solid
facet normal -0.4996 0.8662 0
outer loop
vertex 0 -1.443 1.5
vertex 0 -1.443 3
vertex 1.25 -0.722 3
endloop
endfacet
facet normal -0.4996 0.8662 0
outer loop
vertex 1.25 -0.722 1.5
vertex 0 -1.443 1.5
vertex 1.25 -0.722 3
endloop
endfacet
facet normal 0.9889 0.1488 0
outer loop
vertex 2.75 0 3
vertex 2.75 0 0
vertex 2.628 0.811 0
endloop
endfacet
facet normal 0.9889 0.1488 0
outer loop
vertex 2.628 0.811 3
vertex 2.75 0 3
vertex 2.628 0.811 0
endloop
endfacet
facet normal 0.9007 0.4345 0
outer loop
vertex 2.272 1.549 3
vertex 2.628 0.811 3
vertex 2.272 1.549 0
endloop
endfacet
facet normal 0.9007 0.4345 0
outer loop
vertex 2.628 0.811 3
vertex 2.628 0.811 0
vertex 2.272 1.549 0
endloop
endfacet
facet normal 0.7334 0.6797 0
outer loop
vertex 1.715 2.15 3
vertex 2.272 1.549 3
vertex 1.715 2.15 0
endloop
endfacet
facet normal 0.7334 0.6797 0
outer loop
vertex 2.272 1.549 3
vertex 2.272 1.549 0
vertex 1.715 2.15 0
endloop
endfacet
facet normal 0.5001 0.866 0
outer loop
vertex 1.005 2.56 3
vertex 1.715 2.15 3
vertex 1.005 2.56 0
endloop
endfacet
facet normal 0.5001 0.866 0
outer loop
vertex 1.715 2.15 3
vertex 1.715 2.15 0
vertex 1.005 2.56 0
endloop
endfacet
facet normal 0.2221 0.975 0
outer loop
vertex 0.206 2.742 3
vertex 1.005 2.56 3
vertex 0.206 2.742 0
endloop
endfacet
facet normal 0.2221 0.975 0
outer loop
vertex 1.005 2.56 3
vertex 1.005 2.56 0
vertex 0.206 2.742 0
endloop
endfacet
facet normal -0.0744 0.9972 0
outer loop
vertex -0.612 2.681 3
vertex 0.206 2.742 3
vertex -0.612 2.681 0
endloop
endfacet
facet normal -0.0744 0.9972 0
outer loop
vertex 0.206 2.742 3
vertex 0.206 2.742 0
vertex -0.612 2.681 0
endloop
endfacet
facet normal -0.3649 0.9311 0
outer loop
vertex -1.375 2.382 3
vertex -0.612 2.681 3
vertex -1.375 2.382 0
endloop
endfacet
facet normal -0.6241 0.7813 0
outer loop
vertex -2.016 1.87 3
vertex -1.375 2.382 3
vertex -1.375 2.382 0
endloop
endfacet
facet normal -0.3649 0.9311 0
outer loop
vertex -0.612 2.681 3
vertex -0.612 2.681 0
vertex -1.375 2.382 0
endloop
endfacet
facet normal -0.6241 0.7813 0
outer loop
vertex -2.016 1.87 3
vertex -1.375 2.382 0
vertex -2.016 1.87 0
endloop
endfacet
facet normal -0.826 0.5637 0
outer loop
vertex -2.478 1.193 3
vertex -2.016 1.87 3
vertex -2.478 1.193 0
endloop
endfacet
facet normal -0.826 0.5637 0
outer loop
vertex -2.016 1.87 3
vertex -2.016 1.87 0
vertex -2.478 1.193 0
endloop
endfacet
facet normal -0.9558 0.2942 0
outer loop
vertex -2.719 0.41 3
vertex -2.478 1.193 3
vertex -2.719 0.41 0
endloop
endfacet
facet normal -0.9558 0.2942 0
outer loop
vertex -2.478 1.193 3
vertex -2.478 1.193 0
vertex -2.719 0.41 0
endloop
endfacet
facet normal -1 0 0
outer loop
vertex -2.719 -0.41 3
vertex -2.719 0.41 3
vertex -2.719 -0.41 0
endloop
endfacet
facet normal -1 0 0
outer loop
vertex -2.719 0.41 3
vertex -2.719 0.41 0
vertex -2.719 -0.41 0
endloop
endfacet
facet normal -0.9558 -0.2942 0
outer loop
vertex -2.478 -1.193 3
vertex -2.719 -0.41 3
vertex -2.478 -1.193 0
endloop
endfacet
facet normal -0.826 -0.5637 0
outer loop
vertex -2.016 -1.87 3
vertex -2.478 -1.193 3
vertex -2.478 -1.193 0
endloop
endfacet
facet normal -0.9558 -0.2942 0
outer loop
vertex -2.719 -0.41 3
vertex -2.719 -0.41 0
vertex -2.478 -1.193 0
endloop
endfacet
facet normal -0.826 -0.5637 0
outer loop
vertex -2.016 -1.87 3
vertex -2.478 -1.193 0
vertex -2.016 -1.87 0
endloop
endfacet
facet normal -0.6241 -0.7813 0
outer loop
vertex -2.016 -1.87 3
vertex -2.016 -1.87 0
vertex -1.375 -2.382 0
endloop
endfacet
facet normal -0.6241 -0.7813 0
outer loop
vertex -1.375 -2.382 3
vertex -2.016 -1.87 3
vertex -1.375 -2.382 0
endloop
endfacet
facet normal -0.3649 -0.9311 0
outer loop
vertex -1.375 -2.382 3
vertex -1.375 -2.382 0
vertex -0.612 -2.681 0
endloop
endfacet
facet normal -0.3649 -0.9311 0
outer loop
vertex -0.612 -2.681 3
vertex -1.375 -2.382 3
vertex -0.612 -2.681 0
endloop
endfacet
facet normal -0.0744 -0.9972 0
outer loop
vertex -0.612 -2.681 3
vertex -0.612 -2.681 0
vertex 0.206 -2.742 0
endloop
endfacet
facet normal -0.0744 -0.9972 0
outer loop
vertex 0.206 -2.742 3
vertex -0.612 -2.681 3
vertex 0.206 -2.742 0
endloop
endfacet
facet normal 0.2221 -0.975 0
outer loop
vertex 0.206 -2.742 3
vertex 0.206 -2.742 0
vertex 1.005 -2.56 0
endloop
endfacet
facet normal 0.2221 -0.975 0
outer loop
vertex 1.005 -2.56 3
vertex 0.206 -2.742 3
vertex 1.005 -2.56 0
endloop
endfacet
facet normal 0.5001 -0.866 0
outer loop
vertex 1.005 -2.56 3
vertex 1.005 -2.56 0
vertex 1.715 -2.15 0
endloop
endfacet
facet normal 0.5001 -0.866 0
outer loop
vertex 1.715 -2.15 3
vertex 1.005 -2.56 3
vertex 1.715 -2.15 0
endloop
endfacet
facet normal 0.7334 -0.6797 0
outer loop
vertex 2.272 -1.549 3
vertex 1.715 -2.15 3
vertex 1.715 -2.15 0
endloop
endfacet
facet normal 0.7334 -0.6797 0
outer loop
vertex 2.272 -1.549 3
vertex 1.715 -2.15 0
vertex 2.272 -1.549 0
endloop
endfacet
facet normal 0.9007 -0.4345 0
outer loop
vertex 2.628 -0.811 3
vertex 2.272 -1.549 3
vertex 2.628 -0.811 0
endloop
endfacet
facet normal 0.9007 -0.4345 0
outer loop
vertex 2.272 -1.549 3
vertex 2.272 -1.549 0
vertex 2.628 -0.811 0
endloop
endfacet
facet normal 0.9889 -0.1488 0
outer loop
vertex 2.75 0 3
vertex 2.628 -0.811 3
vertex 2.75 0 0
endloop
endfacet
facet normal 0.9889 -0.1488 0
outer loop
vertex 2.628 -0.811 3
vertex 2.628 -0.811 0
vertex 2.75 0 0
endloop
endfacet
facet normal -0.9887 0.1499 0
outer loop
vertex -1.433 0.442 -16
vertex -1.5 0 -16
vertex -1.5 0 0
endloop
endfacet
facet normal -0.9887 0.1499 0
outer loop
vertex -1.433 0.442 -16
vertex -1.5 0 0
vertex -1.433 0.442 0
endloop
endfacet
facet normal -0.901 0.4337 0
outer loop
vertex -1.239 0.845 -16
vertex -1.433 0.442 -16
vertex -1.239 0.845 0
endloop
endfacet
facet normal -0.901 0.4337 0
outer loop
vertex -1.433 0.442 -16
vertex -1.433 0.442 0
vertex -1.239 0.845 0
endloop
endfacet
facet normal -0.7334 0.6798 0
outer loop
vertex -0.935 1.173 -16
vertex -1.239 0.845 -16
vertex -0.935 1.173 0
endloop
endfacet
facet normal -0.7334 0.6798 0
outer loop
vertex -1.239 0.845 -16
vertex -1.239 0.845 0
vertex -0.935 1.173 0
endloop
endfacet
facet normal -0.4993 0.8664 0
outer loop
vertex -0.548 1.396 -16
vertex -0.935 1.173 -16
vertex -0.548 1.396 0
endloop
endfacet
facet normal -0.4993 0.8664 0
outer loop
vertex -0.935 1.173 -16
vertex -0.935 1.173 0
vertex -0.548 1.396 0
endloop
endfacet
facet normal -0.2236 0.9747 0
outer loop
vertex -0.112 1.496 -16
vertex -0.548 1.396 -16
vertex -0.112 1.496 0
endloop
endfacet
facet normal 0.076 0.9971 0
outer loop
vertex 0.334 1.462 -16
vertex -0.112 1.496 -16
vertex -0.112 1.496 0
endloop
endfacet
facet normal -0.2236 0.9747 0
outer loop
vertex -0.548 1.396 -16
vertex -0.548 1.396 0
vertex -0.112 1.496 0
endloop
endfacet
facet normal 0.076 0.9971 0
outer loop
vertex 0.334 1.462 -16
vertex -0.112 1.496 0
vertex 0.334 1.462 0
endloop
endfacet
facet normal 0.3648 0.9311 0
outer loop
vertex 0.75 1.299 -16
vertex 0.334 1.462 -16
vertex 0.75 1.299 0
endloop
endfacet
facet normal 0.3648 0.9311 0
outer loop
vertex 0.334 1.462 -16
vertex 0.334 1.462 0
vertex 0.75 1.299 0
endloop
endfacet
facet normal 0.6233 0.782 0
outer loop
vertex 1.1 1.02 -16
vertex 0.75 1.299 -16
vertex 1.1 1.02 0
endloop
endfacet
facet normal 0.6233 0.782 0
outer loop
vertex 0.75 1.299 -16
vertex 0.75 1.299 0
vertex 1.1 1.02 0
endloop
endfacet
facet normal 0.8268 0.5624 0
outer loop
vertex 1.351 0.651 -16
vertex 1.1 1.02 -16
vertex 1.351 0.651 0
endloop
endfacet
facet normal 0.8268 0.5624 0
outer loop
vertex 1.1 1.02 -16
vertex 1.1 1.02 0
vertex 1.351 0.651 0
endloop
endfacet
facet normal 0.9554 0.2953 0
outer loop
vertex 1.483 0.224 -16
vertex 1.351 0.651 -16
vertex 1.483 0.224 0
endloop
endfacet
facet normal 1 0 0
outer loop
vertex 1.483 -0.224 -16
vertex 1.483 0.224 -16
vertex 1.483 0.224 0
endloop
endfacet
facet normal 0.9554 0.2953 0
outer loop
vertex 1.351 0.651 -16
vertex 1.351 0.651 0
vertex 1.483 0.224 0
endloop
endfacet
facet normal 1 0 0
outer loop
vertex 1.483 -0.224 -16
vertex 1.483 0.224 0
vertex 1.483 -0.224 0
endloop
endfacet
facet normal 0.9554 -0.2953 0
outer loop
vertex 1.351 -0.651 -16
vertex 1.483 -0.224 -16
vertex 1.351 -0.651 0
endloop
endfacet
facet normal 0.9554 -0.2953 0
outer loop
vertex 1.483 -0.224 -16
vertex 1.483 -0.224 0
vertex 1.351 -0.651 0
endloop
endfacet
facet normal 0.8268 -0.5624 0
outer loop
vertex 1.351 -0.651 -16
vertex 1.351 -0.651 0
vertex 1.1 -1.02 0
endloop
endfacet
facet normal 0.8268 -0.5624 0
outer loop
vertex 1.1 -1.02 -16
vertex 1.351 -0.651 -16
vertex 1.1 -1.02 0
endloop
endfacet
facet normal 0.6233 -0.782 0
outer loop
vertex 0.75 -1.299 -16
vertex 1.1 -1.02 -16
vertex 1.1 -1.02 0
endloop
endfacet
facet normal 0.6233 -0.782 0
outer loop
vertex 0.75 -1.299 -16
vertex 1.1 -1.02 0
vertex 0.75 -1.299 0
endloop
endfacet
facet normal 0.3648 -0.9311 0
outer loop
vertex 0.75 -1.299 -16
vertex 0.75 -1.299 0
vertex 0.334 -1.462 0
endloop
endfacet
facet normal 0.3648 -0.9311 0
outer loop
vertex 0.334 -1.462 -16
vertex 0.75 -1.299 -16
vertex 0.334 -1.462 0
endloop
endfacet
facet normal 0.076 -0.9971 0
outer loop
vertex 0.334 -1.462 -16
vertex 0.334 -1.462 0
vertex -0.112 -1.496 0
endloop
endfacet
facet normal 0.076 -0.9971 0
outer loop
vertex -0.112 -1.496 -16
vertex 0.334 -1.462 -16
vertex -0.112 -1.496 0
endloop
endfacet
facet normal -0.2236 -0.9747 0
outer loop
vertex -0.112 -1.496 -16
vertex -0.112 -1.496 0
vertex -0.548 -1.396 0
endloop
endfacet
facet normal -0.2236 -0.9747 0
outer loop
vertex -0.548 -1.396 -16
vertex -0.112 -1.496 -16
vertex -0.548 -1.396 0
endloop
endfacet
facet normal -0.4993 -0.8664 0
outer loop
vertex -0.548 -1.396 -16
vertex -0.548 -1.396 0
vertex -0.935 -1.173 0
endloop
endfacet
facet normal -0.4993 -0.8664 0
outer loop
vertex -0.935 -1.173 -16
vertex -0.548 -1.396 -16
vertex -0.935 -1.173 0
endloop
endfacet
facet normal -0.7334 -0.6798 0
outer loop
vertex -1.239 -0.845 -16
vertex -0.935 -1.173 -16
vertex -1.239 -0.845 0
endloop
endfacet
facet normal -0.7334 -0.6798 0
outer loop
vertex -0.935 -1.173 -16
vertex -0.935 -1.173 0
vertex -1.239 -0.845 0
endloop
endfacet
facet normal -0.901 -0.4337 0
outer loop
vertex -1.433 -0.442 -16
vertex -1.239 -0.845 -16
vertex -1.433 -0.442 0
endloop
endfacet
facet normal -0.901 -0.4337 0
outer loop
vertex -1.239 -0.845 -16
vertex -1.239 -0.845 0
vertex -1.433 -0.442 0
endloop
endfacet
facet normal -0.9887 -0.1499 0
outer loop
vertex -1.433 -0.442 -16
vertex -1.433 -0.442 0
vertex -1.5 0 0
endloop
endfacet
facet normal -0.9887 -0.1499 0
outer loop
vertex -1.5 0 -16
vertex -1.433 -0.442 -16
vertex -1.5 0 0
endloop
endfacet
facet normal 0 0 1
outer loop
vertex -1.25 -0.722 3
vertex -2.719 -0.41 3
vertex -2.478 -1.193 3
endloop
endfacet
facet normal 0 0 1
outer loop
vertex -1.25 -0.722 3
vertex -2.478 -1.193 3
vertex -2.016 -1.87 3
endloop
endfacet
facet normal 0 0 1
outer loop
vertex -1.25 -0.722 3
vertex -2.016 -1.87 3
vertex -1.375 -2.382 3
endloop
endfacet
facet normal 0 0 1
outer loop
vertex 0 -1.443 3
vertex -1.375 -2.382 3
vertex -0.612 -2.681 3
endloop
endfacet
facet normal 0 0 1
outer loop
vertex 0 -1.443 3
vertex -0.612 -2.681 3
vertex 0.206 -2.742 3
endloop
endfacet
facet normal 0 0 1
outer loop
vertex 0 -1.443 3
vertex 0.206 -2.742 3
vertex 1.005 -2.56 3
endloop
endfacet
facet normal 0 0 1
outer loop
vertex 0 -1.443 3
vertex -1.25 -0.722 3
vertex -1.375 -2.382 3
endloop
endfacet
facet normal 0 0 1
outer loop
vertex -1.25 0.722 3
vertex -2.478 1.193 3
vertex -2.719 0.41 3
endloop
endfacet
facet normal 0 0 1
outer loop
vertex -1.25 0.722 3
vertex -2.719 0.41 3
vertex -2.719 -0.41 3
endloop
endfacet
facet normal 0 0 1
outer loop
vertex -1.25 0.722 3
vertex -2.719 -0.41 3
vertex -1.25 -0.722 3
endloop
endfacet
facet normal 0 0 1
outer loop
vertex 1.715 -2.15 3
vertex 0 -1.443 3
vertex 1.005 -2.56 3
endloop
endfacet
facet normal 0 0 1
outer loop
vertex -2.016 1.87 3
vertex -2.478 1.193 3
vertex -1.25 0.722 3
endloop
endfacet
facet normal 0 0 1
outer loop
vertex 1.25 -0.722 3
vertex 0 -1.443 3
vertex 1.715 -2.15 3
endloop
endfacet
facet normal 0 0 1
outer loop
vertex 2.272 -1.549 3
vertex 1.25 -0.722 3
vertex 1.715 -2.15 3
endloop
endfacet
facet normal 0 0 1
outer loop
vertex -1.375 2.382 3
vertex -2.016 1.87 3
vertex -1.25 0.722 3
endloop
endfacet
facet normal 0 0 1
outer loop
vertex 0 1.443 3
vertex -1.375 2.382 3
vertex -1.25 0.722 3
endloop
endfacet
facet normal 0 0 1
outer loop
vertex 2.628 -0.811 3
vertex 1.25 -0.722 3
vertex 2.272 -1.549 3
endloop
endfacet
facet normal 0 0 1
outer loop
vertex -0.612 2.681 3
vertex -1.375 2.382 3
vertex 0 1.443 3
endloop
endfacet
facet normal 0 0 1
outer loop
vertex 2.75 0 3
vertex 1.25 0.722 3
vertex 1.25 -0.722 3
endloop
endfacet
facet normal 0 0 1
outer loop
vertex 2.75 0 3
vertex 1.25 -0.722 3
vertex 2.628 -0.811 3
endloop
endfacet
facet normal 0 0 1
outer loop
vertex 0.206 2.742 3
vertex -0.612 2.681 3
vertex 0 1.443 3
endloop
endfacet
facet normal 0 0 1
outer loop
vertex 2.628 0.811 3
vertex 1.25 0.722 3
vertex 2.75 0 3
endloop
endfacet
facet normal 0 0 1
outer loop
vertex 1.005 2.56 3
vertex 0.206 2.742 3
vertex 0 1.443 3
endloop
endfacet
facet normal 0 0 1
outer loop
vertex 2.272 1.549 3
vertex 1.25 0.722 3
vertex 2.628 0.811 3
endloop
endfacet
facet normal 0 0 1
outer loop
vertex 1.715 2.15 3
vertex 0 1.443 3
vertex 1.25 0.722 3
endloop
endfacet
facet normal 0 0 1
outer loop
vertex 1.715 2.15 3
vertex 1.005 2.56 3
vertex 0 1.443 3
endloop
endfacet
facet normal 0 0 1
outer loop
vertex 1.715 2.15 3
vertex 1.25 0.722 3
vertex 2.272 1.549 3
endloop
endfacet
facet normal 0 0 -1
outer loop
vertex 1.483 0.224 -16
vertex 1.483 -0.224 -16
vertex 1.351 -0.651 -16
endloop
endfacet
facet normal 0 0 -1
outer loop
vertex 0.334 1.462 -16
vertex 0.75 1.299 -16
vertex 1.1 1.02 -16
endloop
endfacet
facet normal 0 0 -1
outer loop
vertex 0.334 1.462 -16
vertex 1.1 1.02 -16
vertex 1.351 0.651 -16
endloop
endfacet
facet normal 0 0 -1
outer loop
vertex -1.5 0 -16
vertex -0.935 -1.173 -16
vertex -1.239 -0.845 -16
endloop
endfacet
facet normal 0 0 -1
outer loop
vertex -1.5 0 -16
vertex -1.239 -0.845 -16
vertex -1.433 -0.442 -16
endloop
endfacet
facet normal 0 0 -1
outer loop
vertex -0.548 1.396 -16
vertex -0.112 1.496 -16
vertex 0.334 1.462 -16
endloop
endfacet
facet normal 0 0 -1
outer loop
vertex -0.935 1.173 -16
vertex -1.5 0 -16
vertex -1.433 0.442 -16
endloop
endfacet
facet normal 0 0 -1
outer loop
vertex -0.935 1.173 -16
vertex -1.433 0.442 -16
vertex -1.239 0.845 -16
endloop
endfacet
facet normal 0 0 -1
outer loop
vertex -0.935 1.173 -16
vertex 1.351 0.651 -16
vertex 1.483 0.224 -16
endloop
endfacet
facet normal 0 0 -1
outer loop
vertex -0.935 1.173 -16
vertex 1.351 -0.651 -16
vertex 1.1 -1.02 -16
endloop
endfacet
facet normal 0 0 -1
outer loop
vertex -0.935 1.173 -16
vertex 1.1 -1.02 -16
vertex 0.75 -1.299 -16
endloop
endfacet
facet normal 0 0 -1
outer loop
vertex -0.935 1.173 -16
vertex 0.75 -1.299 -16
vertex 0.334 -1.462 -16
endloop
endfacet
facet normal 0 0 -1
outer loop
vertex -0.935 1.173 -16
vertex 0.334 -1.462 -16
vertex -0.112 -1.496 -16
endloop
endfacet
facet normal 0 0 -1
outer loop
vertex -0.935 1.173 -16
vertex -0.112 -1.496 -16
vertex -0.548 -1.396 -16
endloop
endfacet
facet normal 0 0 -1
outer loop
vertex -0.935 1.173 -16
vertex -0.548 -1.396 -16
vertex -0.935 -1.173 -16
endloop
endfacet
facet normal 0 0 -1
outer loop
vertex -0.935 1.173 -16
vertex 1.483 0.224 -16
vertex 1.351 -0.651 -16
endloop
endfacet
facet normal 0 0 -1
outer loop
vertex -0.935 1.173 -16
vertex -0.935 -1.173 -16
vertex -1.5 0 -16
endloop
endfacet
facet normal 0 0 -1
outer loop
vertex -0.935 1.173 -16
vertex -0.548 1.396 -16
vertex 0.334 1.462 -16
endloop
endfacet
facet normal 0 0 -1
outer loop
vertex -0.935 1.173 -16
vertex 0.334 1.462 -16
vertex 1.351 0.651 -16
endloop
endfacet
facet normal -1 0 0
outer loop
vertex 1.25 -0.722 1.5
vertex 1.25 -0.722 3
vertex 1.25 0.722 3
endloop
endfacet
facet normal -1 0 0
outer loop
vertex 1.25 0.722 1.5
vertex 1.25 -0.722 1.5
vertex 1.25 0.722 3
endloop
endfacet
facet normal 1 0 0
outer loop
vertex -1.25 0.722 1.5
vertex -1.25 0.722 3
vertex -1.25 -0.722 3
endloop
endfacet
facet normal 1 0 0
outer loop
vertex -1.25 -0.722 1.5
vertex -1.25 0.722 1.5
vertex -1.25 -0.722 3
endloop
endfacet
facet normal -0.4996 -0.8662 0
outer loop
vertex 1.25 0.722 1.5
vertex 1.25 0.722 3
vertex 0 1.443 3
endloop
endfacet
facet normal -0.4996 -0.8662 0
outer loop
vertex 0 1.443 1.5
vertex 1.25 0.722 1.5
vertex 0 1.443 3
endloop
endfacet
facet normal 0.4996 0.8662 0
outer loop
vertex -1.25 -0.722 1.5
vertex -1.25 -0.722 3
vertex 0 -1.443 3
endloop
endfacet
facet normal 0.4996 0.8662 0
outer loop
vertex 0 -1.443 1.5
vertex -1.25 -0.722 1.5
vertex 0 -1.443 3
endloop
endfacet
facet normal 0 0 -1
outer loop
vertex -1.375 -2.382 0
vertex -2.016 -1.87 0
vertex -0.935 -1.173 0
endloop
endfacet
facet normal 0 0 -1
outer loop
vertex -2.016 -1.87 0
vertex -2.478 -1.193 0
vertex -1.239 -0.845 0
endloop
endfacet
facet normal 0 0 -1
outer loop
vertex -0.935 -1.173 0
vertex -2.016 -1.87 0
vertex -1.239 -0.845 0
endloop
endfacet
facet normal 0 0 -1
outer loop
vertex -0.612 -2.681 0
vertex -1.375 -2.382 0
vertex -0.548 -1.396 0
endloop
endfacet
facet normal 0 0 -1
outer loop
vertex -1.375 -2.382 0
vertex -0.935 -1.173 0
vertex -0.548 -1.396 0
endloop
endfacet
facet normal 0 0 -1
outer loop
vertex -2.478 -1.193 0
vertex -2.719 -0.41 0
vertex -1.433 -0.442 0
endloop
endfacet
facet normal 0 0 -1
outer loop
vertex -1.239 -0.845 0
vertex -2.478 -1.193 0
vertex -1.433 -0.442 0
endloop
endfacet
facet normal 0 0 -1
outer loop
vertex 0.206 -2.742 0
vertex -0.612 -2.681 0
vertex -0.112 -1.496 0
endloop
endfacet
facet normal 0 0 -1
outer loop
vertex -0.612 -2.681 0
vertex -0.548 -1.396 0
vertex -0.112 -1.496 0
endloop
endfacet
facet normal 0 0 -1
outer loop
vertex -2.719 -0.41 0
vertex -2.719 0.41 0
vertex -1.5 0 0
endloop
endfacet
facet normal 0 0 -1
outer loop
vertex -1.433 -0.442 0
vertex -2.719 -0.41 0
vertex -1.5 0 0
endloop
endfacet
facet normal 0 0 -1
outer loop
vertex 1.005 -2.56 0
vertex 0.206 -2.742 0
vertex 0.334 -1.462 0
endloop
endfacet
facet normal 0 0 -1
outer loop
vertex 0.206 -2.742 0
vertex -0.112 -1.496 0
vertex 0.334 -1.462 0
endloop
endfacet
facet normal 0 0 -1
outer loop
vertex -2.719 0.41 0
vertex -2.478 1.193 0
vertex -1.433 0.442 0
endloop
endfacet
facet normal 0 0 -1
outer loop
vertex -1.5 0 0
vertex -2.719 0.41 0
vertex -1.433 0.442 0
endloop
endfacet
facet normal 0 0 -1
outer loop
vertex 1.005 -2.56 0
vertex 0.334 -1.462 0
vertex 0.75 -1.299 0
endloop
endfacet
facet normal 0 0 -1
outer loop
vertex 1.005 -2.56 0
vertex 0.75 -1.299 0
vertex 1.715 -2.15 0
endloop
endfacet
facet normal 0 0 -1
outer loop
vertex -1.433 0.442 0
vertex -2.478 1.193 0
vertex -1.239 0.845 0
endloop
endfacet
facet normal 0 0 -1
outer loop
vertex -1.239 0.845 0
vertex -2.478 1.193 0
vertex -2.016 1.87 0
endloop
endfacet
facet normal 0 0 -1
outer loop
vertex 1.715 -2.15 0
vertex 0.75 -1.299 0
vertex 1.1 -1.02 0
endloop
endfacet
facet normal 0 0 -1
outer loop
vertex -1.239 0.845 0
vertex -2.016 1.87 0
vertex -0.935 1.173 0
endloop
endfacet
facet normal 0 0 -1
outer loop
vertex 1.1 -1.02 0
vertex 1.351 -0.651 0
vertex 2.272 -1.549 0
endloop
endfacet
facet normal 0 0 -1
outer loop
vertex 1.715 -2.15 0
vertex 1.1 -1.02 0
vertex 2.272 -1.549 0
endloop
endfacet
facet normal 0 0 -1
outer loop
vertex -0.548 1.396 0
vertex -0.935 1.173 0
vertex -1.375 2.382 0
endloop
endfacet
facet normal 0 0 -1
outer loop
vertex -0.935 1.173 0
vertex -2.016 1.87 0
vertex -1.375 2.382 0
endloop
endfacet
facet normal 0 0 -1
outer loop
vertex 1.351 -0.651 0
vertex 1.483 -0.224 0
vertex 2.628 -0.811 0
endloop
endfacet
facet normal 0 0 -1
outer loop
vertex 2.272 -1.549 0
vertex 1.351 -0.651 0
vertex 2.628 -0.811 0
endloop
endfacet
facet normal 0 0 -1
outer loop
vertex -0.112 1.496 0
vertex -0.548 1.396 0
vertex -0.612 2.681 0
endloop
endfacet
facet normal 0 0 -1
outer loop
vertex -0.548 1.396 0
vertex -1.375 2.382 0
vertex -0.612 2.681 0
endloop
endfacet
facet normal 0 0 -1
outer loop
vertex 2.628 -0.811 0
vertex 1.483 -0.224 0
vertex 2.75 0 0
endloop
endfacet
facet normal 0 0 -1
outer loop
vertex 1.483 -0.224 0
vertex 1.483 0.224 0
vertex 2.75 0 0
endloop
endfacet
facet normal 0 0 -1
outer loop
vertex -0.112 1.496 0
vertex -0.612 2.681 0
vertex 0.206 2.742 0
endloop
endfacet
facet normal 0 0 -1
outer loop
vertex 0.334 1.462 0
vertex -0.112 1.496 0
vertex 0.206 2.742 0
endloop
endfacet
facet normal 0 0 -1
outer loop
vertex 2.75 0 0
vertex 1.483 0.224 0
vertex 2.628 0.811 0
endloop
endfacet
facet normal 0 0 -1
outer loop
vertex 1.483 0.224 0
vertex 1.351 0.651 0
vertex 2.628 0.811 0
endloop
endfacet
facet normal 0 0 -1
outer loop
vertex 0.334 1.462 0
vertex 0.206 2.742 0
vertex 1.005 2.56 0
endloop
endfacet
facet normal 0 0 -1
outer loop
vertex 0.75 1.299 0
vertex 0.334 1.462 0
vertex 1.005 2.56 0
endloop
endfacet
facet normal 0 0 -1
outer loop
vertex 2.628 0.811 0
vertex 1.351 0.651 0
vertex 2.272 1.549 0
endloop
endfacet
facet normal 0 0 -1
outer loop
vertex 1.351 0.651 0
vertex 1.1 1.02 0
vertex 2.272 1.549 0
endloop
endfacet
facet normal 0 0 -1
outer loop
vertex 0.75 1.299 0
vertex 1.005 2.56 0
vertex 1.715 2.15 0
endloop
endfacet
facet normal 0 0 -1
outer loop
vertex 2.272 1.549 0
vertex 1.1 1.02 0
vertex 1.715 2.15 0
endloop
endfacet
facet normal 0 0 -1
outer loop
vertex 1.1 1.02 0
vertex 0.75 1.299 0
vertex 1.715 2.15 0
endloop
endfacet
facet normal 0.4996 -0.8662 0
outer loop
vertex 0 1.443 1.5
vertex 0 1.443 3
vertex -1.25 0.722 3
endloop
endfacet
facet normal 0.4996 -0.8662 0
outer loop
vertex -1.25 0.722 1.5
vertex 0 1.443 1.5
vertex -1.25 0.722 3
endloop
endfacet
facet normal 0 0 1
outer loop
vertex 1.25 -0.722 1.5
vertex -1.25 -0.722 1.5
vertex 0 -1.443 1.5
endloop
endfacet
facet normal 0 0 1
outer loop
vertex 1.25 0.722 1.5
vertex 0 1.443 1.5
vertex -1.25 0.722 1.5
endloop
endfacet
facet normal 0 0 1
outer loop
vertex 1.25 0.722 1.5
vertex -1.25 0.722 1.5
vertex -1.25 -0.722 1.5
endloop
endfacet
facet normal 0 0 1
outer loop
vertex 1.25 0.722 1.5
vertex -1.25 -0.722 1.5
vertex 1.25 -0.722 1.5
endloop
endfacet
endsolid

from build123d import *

# Parameters (mm, degrees)
SKETCH_1_R          = 2.75
EXTRUDE_1_DEPTH     = 3
CUT_EXTRUDE_1_DEPTH = 1.5
SKETCH_3_R          = 1.5
EXTRUDE_2_DEPTH     = 16


with BuildPart() as part:
    # 草图1 → 凸台-拉伸1 (new body)
    with BuildSketch(Plane.XY):
        Circle(SKETCH_1_R)
    extrude(amount=EXTRUDE_1_DEPTH)

    # 草图2 → 切除-拉伸1 (cut)
    with BuildSketch(Plane.XY.offset(3)):
        Polygon((0, -1.443375673), (1.25, -0.721687836), (1.25, 0.721687836), (0, 1.443375673), (-1.25, 0.721687836), (-1.25, -0.721687836), align=None)
    extrude(amount=-CUT_EXTRUDE_1_DEPTH, mode=Mode.SUBTRACT)

    # 草图3 → 凸台-拉伸2 (add)
    with BuildSketch(Plane(origin=(0, 0, 0), x_dir=(-1, 0, 0), z_dir=(0, 0, -1))):
        Circle(SKETCH_3_R)
    extrude(amount=EXTRUDE_2_DEPTH)


solid = part.part
